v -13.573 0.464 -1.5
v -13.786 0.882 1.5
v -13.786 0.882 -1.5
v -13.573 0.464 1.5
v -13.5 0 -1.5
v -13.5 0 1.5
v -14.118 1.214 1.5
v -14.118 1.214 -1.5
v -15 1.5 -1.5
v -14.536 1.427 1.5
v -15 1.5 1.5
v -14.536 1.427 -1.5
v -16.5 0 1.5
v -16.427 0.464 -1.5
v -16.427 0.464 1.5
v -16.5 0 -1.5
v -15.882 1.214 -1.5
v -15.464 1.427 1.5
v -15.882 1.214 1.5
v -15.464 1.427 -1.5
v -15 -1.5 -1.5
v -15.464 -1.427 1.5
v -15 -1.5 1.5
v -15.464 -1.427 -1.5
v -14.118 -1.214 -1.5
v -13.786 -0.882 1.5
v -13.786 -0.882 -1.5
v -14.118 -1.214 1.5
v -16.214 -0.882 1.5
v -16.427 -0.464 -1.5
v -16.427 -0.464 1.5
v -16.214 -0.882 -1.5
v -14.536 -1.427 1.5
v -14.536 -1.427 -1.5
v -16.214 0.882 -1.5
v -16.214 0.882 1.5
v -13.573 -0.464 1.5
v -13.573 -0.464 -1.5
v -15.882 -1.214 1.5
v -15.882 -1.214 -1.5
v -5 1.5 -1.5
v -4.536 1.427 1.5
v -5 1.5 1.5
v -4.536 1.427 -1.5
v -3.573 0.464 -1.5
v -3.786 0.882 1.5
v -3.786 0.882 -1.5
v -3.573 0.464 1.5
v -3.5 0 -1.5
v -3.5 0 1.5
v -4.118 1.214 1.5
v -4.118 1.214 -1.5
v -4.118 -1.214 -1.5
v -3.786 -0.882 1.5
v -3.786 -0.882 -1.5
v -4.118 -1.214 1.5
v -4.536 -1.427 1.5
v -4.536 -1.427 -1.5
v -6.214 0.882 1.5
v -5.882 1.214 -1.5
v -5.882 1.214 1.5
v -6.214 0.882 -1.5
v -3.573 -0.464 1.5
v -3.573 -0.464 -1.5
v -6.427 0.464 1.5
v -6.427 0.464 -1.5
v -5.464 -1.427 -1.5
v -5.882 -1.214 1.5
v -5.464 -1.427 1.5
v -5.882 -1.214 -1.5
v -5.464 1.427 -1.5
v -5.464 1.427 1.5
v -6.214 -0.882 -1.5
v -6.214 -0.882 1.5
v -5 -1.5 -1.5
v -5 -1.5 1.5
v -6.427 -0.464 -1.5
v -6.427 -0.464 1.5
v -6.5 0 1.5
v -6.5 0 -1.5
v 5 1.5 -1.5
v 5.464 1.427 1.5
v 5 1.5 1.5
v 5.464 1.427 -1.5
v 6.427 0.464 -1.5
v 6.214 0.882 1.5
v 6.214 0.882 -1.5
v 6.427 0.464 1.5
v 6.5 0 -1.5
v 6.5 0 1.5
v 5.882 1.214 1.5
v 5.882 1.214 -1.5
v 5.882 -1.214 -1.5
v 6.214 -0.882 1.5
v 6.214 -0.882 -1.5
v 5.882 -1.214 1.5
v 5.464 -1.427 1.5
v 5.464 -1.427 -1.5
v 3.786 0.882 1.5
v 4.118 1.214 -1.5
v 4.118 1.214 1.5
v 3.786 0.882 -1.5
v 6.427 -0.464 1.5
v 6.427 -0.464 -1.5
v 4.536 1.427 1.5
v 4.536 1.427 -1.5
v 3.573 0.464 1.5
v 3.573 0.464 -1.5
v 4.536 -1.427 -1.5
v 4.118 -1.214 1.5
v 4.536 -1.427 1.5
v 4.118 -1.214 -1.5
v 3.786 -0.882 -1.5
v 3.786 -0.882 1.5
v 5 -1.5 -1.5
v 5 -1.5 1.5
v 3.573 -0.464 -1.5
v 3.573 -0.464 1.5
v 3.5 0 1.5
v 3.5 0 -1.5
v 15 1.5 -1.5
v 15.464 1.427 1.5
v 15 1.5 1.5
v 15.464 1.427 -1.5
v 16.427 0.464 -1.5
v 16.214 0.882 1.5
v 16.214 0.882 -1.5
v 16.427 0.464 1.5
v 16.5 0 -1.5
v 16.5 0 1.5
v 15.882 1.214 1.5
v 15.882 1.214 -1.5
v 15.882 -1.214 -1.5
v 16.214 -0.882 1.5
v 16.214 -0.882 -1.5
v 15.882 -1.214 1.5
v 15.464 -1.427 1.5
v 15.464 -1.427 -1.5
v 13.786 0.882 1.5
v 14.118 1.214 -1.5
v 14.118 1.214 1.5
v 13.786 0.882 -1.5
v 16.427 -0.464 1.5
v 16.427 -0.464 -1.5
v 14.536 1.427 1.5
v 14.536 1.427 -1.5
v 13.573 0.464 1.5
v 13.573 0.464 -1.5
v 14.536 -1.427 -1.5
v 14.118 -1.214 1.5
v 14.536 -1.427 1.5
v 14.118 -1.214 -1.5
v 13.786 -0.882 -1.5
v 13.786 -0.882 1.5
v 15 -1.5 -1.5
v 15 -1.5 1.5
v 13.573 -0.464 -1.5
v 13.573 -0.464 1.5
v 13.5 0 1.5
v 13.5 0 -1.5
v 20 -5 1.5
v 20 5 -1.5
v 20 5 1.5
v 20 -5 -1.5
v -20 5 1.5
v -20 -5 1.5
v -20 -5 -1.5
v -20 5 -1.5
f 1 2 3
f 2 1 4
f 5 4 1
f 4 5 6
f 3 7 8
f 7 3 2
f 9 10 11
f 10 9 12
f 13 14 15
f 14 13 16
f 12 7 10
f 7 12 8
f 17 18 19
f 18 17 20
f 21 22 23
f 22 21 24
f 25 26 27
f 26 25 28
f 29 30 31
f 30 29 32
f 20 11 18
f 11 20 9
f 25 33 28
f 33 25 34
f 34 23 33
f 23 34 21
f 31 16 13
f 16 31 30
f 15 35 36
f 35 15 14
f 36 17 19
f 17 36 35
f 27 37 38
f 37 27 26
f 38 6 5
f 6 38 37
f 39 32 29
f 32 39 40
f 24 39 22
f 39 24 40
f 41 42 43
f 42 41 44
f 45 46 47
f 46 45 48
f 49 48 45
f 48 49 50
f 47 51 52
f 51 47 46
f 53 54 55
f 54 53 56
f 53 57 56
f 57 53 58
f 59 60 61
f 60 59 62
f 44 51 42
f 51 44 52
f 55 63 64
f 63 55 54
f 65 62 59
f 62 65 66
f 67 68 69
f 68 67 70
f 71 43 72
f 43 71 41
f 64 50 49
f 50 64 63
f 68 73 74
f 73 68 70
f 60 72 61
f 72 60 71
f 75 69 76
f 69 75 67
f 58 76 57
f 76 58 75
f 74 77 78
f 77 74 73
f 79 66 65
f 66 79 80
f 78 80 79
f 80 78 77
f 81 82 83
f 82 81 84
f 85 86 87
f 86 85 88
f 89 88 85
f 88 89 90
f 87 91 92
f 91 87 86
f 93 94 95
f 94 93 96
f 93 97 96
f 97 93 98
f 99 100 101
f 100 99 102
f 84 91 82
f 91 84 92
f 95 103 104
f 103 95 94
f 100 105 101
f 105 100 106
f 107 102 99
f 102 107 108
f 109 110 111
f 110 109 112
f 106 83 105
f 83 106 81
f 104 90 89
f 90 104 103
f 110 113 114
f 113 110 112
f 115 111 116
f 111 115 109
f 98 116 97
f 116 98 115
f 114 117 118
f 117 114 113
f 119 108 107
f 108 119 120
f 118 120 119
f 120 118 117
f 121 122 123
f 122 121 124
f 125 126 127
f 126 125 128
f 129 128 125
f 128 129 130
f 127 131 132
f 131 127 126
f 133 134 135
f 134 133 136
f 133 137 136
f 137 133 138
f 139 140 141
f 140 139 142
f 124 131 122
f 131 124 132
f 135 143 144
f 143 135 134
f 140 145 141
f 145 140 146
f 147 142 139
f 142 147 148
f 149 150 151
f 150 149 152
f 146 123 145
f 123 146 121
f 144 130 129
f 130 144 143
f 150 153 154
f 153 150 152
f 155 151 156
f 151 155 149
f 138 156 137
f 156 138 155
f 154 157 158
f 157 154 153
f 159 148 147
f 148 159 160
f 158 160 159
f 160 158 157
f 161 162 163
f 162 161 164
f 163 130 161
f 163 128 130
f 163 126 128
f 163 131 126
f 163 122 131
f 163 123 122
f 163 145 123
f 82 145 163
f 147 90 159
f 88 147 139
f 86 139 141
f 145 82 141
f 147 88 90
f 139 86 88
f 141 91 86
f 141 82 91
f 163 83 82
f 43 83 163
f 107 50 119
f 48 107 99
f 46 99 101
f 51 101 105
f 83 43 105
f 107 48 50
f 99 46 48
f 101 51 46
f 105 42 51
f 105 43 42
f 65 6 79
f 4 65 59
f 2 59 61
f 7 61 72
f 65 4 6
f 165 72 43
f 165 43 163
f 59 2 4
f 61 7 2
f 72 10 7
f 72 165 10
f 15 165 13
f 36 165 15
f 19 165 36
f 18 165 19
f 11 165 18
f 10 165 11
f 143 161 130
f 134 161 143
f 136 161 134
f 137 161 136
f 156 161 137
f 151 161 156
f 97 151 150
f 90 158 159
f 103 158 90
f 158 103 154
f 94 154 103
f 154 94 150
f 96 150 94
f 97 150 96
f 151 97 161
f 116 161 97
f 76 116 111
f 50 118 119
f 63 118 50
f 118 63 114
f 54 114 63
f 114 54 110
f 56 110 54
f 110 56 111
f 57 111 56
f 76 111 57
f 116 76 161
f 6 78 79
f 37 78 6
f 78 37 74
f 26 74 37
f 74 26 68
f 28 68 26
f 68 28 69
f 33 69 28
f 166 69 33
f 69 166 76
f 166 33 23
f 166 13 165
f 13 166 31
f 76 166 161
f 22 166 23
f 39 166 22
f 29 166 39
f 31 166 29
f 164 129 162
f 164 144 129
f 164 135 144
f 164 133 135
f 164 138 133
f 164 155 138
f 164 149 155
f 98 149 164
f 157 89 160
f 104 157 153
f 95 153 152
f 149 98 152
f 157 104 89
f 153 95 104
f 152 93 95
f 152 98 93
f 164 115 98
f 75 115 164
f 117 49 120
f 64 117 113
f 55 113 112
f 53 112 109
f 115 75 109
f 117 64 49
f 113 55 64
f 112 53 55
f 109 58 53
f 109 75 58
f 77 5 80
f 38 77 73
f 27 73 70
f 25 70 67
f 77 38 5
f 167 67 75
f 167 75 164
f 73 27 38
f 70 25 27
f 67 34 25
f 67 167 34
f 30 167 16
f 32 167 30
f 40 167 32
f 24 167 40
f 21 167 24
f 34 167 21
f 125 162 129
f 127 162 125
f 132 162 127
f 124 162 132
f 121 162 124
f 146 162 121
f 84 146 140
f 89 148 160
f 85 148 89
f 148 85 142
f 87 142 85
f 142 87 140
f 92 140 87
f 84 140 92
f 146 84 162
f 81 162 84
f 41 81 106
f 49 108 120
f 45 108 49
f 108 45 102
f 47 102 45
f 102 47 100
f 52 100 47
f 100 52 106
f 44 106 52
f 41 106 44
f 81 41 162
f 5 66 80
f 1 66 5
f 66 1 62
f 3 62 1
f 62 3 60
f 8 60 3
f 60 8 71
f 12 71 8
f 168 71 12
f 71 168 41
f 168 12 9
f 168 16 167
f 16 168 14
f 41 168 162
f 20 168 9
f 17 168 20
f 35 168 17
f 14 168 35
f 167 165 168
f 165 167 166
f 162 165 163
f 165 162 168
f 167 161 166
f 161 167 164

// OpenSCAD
//----------------------------------------------------------
//-- Tutorial OpenScad
//-- Juan Gonzalez-Gomez (Obijuan) juan@iearobotics.com
//----------------------------------------------------------
//-- (c) Mayo, 2012
//-- Licencia GPL
//----------------------------------------------------------
//-- Ejemplo 1: Pieza de mecano
//-- Pieza basica de mecano, parametrizada
//----------------------------------------------------------

//-- Parametros de la pieza
drill=3;
d=10;
n = 4;

lx = n*d;
anchura = 10;
grosor = 3;

//-- construccion de la pieza
difference() {
  //-- Cuerpo de la pieza
  cube([lx,anchura,grosor],center=true);

  //-- Taladros
  translate([-lx/2+d/2,0,0])
    for (i=[0:n-1]) {
      translate([i*d,0,0])
        cylinder(r=drill/2, h=grosor+5, $fn=20,center=true);
  }
}
